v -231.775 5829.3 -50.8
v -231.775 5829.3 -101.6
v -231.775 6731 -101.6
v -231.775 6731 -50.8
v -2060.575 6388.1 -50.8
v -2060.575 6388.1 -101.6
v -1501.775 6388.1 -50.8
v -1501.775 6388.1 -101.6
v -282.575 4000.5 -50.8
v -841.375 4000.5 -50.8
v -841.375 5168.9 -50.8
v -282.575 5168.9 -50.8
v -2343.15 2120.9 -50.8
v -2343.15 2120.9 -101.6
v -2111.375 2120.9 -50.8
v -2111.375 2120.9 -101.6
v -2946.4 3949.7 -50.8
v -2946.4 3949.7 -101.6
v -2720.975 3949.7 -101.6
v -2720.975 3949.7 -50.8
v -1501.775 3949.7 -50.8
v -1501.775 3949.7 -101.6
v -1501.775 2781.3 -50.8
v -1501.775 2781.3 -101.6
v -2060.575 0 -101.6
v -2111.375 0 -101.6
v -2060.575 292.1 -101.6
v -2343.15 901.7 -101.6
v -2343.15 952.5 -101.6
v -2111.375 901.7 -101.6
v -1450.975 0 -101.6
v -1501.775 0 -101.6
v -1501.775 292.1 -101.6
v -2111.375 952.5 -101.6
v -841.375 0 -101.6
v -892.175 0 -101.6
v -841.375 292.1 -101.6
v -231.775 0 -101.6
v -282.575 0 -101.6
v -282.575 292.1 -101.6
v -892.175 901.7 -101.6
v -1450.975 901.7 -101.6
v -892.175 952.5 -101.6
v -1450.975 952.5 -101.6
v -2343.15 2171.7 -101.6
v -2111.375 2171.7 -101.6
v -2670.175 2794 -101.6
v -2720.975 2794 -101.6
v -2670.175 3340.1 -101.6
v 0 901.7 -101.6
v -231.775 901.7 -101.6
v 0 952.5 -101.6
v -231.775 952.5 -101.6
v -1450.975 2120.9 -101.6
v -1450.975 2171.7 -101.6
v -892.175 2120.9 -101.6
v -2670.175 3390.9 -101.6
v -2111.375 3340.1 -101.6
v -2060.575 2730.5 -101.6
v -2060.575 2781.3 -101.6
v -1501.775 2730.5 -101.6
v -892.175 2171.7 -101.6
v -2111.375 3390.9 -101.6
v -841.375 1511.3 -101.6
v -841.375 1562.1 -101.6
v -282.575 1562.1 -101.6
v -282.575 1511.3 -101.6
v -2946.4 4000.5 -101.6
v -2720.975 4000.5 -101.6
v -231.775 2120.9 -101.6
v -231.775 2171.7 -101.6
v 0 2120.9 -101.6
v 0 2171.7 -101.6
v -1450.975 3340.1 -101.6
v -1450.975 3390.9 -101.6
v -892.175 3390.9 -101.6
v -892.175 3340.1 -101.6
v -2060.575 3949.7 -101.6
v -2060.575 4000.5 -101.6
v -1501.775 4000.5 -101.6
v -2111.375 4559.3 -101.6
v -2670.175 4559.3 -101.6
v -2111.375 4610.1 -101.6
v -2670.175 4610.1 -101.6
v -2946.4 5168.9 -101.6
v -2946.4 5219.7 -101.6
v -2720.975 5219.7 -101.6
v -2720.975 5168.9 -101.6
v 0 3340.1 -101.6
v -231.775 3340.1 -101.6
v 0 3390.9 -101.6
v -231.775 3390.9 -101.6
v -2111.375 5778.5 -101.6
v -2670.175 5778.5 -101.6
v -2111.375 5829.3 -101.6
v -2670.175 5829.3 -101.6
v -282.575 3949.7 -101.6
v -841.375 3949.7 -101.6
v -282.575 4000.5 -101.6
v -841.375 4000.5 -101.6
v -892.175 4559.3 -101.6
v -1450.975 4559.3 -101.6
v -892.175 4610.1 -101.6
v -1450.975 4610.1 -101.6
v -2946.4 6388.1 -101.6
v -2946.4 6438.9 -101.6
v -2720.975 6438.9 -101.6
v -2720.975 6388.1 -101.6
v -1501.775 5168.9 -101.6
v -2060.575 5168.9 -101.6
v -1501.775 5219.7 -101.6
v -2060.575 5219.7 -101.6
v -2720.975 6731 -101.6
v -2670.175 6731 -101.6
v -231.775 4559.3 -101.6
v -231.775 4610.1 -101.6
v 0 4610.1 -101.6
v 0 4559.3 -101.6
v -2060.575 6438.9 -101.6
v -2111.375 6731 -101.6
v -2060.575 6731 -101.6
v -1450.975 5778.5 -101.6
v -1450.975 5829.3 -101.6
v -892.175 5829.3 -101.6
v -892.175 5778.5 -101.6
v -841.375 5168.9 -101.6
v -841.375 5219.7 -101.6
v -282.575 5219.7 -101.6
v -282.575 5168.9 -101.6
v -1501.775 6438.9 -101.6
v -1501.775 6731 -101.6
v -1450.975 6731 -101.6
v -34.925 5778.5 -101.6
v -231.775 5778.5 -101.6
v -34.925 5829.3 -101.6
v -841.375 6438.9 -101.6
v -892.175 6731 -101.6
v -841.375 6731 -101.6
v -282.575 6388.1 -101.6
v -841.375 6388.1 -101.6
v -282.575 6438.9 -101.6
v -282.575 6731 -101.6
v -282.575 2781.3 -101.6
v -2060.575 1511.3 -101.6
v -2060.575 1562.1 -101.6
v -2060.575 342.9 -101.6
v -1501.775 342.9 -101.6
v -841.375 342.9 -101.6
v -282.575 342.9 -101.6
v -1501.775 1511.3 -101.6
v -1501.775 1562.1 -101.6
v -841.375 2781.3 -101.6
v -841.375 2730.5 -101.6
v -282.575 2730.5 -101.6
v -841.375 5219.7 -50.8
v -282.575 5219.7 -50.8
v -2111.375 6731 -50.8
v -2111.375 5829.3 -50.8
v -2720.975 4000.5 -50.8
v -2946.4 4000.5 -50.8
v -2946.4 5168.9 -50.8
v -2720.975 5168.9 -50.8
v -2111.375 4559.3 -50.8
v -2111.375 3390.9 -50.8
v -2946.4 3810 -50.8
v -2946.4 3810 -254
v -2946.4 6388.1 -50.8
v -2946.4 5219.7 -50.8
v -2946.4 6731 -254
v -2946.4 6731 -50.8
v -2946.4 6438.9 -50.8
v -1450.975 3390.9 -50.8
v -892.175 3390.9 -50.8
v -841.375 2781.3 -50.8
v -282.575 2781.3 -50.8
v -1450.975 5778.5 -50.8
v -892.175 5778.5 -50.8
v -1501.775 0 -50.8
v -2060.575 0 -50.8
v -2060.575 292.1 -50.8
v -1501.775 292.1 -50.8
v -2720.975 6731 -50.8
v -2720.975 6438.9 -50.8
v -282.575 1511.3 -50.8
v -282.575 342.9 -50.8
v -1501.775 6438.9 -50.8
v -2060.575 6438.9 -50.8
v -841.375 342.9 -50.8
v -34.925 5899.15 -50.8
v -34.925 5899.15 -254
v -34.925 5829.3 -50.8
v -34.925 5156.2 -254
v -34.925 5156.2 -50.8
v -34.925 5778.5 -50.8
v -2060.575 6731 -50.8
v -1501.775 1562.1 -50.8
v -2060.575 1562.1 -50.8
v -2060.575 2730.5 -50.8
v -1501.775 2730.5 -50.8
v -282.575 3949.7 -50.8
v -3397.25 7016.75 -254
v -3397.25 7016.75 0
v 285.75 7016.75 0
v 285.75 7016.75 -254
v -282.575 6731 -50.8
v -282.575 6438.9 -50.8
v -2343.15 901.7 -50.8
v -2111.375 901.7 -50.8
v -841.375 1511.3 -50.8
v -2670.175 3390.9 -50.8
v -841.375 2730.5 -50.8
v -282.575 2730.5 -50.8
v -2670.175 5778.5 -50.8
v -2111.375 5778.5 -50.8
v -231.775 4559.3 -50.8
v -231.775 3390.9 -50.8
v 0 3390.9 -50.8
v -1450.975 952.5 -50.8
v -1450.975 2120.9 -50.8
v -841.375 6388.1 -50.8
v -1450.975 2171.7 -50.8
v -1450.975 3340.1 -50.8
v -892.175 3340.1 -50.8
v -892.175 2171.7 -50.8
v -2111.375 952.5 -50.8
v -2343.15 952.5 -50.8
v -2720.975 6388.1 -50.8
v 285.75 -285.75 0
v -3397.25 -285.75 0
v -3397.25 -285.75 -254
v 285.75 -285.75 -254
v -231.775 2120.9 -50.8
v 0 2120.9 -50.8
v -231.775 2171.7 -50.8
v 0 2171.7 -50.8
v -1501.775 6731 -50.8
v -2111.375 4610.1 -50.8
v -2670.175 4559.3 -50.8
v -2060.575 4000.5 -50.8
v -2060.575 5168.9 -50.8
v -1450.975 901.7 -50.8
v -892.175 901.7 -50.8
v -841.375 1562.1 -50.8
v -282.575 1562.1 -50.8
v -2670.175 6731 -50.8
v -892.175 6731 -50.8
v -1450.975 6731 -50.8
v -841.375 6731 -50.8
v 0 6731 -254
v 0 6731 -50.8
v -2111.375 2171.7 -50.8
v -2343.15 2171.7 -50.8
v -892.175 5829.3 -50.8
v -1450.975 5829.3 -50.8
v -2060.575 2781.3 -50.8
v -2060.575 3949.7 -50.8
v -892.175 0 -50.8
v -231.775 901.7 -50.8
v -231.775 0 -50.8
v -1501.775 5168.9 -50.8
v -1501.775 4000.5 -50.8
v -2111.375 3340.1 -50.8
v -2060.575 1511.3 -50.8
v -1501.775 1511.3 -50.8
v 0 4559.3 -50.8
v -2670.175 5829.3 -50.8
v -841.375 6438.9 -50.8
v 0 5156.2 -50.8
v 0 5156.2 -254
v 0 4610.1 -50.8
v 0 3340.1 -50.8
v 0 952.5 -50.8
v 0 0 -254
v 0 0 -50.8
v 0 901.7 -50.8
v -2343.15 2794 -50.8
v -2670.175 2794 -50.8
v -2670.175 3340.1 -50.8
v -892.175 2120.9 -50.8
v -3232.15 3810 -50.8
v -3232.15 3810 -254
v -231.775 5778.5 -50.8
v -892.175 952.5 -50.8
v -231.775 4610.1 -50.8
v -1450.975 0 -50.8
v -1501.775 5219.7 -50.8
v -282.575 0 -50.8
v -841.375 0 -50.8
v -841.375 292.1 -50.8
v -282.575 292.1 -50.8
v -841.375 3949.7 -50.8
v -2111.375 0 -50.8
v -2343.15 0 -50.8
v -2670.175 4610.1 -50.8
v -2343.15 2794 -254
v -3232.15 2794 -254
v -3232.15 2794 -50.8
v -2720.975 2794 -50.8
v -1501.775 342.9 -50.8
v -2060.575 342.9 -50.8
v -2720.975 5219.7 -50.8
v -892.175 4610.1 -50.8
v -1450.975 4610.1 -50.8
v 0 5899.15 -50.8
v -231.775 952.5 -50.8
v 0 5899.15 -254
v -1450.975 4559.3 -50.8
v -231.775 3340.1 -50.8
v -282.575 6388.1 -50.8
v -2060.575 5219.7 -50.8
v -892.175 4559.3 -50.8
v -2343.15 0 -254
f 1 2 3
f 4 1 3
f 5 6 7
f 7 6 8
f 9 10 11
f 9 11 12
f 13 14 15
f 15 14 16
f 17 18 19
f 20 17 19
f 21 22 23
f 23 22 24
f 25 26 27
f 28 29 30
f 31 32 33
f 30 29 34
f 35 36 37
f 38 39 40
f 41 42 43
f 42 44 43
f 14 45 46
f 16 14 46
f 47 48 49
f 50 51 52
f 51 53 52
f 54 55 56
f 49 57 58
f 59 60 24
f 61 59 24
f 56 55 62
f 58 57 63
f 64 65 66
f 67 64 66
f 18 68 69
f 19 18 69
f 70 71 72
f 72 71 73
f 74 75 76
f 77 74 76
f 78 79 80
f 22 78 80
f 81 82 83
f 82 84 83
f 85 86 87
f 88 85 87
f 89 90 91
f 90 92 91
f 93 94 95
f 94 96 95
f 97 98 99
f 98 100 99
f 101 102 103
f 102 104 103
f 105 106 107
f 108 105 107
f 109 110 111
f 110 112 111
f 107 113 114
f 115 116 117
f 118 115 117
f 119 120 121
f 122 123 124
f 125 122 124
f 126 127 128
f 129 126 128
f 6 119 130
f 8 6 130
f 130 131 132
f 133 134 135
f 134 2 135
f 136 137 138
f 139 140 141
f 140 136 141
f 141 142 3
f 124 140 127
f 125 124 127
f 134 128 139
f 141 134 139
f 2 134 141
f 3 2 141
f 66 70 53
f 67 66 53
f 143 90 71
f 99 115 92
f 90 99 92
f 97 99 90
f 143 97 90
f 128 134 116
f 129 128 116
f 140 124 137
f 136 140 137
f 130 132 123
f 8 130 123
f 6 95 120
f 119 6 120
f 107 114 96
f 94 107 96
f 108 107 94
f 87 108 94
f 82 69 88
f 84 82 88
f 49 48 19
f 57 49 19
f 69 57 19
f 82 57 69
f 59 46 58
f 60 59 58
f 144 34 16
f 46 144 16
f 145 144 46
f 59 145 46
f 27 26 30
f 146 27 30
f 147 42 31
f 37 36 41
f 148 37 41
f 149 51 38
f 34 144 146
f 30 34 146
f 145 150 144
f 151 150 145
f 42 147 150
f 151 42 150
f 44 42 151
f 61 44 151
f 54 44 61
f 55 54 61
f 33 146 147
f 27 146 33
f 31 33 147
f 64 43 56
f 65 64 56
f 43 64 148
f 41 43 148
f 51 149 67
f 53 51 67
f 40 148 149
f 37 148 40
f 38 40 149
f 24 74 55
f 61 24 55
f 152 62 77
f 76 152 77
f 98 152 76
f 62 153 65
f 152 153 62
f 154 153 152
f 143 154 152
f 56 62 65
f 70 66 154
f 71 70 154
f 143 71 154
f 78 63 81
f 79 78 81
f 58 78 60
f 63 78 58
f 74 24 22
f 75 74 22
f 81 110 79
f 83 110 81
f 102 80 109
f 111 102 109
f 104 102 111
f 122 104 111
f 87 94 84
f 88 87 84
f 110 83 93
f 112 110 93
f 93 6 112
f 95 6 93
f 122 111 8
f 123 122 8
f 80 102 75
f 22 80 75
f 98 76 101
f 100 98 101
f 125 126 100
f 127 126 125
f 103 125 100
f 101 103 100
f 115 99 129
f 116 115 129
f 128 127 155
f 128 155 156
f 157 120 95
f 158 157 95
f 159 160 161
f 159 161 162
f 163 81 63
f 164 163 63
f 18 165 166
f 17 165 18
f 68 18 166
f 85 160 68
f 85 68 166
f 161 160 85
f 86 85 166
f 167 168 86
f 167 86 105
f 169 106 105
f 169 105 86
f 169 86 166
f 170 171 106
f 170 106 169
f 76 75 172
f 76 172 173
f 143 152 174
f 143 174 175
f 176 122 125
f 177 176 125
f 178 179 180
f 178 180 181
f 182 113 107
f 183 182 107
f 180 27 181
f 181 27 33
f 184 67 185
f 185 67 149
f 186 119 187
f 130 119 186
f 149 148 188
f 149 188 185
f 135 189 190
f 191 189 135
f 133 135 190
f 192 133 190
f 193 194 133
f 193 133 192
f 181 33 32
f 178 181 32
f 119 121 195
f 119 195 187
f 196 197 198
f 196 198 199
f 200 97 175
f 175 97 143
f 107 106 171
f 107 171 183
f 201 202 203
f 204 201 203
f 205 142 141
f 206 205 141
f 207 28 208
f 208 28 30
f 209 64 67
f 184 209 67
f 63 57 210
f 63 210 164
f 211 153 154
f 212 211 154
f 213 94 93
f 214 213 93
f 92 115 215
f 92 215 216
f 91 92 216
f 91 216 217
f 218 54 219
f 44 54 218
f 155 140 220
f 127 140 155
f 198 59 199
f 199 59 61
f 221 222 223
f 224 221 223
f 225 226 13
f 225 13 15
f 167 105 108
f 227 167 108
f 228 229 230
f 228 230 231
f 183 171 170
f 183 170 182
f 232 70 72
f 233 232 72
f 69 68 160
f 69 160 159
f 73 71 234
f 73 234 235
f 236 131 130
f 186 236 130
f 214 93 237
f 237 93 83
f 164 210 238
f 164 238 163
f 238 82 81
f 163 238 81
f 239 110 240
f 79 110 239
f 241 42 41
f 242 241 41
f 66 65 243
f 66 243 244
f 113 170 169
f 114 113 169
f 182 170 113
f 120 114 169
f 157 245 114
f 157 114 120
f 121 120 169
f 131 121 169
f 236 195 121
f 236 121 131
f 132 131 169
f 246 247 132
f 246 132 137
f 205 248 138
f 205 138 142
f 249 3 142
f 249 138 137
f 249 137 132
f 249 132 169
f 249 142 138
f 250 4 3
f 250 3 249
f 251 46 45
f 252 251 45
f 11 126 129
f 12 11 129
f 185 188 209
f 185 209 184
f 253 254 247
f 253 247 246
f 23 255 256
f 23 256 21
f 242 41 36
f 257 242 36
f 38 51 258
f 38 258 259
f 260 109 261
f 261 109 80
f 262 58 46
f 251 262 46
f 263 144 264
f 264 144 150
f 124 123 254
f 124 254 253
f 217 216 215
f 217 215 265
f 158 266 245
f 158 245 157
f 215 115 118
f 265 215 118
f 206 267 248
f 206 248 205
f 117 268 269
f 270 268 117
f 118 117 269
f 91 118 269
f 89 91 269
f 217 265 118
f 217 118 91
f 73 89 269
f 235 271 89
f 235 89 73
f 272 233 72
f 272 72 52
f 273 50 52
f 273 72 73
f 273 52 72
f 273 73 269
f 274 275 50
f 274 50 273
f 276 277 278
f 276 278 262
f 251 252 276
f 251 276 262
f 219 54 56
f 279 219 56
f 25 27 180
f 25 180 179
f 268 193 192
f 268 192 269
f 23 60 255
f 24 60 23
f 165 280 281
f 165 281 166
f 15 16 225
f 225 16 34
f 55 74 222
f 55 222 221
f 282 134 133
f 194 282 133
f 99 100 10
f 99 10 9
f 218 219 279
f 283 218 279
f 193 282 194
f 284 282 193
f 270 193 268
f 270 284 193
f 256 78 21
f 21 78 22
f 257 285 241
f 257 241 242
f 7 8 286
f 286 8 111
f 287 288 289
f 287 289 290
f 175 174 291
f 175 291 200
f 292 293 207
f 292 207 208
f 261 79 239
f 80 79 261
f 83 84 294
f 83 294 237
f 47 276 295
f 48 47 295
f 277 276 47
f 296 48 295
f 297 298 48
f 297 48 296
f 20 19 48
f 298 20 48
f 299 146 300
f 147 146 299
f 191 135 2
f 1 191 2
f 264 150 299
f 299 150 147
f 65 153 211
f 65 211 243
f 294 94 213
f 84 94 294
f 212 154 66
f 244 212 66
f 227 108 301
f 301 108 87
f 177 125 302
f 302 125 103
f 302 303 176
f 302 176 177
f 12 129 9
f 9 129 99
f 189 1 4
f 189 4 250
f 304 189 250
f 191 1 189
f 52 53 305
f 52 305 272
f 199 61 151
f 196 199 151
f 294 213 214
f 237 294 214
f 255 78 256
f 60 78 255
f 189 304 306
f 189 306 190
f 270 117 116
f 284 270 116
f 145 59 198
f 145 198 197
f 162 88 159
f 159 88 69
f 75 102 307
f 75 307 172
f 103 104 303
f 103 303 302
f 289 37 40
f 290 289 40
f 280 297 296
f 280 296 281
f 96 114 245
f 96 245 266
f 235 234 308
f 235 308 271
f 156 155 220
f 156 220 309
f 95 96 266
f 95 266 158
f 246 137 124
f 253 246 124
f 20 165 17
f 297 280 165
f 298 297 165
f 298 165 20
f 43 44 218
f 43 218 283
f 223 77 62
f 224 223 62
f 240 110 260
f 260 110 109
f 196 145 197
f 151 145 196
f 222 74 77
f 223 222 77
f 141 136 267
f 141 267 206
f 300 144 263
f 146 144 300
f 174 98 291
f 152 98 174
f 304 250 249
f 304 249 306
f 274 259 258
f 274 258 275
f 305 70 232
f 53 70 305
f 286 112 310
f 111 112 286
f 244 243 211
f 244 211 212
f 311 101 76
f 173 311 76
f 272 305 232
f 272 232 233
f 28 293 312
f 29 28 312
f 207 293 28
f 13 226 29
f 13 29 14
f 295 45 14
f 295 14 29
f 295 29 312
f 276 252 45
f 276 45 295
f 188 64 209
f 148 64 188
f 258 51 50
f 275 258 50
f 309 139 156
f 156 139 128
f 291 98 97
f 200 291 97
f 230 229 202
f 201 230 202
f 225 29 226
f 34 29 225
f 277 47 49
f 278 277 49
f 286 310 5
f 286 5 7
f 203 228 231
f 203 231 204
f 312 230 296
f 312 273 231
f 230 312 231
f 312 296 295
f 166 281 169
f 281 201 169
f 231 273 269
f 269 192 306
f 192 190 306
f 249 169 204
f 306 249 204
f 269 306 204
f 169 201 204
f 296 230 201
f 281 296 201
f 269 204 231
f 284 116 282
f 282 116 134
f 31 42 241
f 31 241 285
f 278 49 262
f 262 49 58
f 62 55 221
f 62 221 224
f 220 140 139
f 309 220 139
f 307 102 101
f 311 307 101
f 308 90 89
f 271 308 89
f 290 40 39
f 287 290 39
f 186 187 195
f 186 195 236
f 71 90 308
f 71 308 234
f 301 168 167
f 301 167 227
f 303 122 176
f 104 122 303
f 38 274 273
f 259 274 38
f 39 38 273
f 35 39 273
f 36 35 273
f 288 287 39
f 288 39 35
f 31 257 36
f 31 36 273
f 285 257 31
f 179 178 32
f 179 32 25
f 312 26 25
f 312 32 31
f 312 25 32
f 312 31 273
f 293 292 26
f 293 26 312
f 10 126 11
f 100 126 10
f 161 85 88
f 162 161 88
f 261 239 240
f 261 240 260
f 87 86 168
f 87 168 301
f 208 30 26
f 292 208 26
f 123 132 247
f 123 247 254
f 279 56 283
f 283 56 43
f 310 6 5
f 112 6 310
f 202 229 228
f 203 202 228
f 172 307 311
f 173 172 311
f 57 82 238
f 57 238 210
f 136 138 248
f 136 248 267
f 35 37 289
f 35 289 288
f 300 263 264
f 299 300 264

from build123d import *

# Parameters (mm, degrees)
F0_W     = 3683
F0_H     = 7302.5
F1_DEPTH = 254
F2_DEPTH = 101.6
F3_W     = 225.425
F3_H     = 1168.4
F3_H_2   = 292.1
F3_W_2   = 558.8
F3_H_3   = 901.7
F3_W_3   = 231.775
F4_DEPTH = 50.8


with BuildPart() as f1:
    # F0 (on Top) → F1 (new body)
    with BuildSketch(Plane.XY):
        with Locations((-1555.75, 3365.5)):
            Rectangle(F0_W, F0_H)
        Polygon((0, 5156.2), (0, 0), (-2343.15, 0), (-2343.15, 2794), (-3232.15, 2794), (-3232.15, 3810), (-2946.4, 3810), (-2946.4, 6731), (0, 6731), (0, 5899.15), (-34.925, 5899.15), (-34.925, 5156.2), align=None, mode=Mode.SUBTRACT)
    extrude(amount=-F1_DEPTH)

    # F0 (on Top) → F2 (join)
    with BuildSketch(Plane.XY):
        with Locations((-1555.75, 3365.5)):
            Rectangle(F0_W, F0_H)
        Polygon((0, 5156.2), (0, 0), (-2343.15, 0), (-2343.15, 2794), (-3232.15, 2794), (-3232.15, 3810), (-2946.4, 3810), (-2946.4, 6731), (0, 6731), (0, 5899.15), (-34.925, 5899.15), (-34.925, 5156.2), align=None, mode=Mode.SUBTRACT)
        Polygon((-2343.15, 0), (0, 0), (0, 5156.2), (-34.925, 5156.2), (-34.925, 5899.15), (0, 5899.15), (0, 6731), (-2946.4, 6731), (-2946.4, 3810), (-3232.15, 3810), (-3232.15, 2794), (-2343.15, 2794), align=None)
    extrude(amount=-F2_DEPTH)

    # F3 (on face) → F4 (cut)
    with BuildSketch(Plane(origin=(0, 0, -101.6), x_dir=(1, 0, 0), z_dir=(0, 0, -1))):
        Polygon((-2720.975, -3949.7), (-2720.975, -2794), (-3232.15, -2794), (-3232.15, -3810), (-2946.4, -3810), (-2946.4, -3949.7), align=None)
        with Locations((-2833.6875, -4584.7)):
            Rectangle(F3_W, F3_H)
        with Locations((-2833.6875, -5803.9)):
            Rectangle(F3_W, F3_H)
        with Locations((-2833.6875, -6584.95)):
            Rectangle(F3_W, F3_H_2)
        with Locations((-2390.775, -6280.15)):
            Rectangle(F3_W_2, F3_H_3)
        with Locations((-2390.775, -5194.3)):
            Rectangle(F3_W_2, F3_H)
        with Locations((-2390.775, -3975.1)):
            Rectangle(F3_W_2, F3_H)
        Polygon((-2111.375, -2171.7), (-2343.15, -2171.7), (-2343.15, -2794), (-2670.175, -2794), (-2670.175, -3340.1), (-2111.375, -3340.1), align=None)
        with Locations((-2227.2625, -1536.7)):
            Rectangle(F3_W_3, F3_H)
        with Locations((-2227.2625, -450.85)):
            Rectangle(F3_W_3, F3_H_3)
        with Locations((-1781.175, -146.05)):
            Rectangle(F3_W_2, F3_H_2)
        with Locations((-1781.175, -927.1)):
            Rectangle(F3_W_2, F3_H)
        with Locations((-1781.175, -2146.3)):
            Rectangle(F3_W_2, F3_H)
        with Locations((-1781.175, -3365.5)):
            Rectangle(F3_W_2, F3_H)
        with Locations((-1781.175, -4584.7)):
            Rectangle(F3_W_2, F3_H)
        with Locations((-1781.175, -5803.9)):
            Rectangle(F3_W_2, F3_H)
        with Locations((-1781.175, -6584.95)):
            Rectangle(F3_W_2, F3_H_2)
        with Locations((-1171.575, -6280.15)):
            Rectangle(F3_W_2, F3_H_3)
        with Locations((-1171.575, -5194.3)):
            Rectangle(F3_W_2, F3_H)
        with Locations((-1171.575, -3975.1)):
            Rectangle(F3_W_2, F3_H)
        with Locations((-1171.575, -2755.9)):
            Rectangle(F3_W_2, F3_H)
        with Locations((-1171.575, -1536.7)):
            Rectangle(F3_W_2, F3_H)
        with Locations((-1171.575, -450.85)):
            Rectangle(F3_W_2, F3_H_3)
        with Locations((-561.975, -146.05)):
            Rectangle(F3_W_2, F3_H_2)
        with Locations((-561.975, -927.1)):
            Rectangle(F3_W_2, F3_H)
        with Locations((-561.975, -2146.3)):
            Rectangle(F3_W_2, F3_H)
        with Locations((-561.975, -3365.5)):
            Rectangle(F3_W_2, F3_H)
        with Locations((-561.975, -4584.7)):
            Rectangle(F3_W_2, F3_H)
        with Locations((-561.975, -5803.9)):
            Rectangle(F3_W_2, F3_H)
        with Locations((-561.975, -6584.95)):
            Rectangle(F3_W_2, F3_H_2)
        Polygon((-34.925, -5899.15), (-34.925, -5829.3), (-231.775, -5829.3), (-231.775, -6731), (0, -6731), (0, -5899.15), align=None)
        Polygon((0, -5156.2), (0, -4610.1), (-231.775, -4610.1), (-231.775, -5778.5), (-34.925, -5778.5), (-34.925, -5156.2), align=None)
        with Locations((-115.8875, -3975.1)):
            Rectangle(F3_W_3, F3_H)
        with Locations((-115.8875, -2755.9)):
            Rectangle(F3_W_3, F3_H)
        with Locations((-115.8875, -1536.7)):
            Rectangle(F3_W_3, F3_H)
        with Locations((-115.8875, -450.85)):
            Rectangle(F3_W_3, F3_H_3)
    extrude(amount=-F4_DEPTH, mode=Mode.SUBTRACT)


solid = f1.part
